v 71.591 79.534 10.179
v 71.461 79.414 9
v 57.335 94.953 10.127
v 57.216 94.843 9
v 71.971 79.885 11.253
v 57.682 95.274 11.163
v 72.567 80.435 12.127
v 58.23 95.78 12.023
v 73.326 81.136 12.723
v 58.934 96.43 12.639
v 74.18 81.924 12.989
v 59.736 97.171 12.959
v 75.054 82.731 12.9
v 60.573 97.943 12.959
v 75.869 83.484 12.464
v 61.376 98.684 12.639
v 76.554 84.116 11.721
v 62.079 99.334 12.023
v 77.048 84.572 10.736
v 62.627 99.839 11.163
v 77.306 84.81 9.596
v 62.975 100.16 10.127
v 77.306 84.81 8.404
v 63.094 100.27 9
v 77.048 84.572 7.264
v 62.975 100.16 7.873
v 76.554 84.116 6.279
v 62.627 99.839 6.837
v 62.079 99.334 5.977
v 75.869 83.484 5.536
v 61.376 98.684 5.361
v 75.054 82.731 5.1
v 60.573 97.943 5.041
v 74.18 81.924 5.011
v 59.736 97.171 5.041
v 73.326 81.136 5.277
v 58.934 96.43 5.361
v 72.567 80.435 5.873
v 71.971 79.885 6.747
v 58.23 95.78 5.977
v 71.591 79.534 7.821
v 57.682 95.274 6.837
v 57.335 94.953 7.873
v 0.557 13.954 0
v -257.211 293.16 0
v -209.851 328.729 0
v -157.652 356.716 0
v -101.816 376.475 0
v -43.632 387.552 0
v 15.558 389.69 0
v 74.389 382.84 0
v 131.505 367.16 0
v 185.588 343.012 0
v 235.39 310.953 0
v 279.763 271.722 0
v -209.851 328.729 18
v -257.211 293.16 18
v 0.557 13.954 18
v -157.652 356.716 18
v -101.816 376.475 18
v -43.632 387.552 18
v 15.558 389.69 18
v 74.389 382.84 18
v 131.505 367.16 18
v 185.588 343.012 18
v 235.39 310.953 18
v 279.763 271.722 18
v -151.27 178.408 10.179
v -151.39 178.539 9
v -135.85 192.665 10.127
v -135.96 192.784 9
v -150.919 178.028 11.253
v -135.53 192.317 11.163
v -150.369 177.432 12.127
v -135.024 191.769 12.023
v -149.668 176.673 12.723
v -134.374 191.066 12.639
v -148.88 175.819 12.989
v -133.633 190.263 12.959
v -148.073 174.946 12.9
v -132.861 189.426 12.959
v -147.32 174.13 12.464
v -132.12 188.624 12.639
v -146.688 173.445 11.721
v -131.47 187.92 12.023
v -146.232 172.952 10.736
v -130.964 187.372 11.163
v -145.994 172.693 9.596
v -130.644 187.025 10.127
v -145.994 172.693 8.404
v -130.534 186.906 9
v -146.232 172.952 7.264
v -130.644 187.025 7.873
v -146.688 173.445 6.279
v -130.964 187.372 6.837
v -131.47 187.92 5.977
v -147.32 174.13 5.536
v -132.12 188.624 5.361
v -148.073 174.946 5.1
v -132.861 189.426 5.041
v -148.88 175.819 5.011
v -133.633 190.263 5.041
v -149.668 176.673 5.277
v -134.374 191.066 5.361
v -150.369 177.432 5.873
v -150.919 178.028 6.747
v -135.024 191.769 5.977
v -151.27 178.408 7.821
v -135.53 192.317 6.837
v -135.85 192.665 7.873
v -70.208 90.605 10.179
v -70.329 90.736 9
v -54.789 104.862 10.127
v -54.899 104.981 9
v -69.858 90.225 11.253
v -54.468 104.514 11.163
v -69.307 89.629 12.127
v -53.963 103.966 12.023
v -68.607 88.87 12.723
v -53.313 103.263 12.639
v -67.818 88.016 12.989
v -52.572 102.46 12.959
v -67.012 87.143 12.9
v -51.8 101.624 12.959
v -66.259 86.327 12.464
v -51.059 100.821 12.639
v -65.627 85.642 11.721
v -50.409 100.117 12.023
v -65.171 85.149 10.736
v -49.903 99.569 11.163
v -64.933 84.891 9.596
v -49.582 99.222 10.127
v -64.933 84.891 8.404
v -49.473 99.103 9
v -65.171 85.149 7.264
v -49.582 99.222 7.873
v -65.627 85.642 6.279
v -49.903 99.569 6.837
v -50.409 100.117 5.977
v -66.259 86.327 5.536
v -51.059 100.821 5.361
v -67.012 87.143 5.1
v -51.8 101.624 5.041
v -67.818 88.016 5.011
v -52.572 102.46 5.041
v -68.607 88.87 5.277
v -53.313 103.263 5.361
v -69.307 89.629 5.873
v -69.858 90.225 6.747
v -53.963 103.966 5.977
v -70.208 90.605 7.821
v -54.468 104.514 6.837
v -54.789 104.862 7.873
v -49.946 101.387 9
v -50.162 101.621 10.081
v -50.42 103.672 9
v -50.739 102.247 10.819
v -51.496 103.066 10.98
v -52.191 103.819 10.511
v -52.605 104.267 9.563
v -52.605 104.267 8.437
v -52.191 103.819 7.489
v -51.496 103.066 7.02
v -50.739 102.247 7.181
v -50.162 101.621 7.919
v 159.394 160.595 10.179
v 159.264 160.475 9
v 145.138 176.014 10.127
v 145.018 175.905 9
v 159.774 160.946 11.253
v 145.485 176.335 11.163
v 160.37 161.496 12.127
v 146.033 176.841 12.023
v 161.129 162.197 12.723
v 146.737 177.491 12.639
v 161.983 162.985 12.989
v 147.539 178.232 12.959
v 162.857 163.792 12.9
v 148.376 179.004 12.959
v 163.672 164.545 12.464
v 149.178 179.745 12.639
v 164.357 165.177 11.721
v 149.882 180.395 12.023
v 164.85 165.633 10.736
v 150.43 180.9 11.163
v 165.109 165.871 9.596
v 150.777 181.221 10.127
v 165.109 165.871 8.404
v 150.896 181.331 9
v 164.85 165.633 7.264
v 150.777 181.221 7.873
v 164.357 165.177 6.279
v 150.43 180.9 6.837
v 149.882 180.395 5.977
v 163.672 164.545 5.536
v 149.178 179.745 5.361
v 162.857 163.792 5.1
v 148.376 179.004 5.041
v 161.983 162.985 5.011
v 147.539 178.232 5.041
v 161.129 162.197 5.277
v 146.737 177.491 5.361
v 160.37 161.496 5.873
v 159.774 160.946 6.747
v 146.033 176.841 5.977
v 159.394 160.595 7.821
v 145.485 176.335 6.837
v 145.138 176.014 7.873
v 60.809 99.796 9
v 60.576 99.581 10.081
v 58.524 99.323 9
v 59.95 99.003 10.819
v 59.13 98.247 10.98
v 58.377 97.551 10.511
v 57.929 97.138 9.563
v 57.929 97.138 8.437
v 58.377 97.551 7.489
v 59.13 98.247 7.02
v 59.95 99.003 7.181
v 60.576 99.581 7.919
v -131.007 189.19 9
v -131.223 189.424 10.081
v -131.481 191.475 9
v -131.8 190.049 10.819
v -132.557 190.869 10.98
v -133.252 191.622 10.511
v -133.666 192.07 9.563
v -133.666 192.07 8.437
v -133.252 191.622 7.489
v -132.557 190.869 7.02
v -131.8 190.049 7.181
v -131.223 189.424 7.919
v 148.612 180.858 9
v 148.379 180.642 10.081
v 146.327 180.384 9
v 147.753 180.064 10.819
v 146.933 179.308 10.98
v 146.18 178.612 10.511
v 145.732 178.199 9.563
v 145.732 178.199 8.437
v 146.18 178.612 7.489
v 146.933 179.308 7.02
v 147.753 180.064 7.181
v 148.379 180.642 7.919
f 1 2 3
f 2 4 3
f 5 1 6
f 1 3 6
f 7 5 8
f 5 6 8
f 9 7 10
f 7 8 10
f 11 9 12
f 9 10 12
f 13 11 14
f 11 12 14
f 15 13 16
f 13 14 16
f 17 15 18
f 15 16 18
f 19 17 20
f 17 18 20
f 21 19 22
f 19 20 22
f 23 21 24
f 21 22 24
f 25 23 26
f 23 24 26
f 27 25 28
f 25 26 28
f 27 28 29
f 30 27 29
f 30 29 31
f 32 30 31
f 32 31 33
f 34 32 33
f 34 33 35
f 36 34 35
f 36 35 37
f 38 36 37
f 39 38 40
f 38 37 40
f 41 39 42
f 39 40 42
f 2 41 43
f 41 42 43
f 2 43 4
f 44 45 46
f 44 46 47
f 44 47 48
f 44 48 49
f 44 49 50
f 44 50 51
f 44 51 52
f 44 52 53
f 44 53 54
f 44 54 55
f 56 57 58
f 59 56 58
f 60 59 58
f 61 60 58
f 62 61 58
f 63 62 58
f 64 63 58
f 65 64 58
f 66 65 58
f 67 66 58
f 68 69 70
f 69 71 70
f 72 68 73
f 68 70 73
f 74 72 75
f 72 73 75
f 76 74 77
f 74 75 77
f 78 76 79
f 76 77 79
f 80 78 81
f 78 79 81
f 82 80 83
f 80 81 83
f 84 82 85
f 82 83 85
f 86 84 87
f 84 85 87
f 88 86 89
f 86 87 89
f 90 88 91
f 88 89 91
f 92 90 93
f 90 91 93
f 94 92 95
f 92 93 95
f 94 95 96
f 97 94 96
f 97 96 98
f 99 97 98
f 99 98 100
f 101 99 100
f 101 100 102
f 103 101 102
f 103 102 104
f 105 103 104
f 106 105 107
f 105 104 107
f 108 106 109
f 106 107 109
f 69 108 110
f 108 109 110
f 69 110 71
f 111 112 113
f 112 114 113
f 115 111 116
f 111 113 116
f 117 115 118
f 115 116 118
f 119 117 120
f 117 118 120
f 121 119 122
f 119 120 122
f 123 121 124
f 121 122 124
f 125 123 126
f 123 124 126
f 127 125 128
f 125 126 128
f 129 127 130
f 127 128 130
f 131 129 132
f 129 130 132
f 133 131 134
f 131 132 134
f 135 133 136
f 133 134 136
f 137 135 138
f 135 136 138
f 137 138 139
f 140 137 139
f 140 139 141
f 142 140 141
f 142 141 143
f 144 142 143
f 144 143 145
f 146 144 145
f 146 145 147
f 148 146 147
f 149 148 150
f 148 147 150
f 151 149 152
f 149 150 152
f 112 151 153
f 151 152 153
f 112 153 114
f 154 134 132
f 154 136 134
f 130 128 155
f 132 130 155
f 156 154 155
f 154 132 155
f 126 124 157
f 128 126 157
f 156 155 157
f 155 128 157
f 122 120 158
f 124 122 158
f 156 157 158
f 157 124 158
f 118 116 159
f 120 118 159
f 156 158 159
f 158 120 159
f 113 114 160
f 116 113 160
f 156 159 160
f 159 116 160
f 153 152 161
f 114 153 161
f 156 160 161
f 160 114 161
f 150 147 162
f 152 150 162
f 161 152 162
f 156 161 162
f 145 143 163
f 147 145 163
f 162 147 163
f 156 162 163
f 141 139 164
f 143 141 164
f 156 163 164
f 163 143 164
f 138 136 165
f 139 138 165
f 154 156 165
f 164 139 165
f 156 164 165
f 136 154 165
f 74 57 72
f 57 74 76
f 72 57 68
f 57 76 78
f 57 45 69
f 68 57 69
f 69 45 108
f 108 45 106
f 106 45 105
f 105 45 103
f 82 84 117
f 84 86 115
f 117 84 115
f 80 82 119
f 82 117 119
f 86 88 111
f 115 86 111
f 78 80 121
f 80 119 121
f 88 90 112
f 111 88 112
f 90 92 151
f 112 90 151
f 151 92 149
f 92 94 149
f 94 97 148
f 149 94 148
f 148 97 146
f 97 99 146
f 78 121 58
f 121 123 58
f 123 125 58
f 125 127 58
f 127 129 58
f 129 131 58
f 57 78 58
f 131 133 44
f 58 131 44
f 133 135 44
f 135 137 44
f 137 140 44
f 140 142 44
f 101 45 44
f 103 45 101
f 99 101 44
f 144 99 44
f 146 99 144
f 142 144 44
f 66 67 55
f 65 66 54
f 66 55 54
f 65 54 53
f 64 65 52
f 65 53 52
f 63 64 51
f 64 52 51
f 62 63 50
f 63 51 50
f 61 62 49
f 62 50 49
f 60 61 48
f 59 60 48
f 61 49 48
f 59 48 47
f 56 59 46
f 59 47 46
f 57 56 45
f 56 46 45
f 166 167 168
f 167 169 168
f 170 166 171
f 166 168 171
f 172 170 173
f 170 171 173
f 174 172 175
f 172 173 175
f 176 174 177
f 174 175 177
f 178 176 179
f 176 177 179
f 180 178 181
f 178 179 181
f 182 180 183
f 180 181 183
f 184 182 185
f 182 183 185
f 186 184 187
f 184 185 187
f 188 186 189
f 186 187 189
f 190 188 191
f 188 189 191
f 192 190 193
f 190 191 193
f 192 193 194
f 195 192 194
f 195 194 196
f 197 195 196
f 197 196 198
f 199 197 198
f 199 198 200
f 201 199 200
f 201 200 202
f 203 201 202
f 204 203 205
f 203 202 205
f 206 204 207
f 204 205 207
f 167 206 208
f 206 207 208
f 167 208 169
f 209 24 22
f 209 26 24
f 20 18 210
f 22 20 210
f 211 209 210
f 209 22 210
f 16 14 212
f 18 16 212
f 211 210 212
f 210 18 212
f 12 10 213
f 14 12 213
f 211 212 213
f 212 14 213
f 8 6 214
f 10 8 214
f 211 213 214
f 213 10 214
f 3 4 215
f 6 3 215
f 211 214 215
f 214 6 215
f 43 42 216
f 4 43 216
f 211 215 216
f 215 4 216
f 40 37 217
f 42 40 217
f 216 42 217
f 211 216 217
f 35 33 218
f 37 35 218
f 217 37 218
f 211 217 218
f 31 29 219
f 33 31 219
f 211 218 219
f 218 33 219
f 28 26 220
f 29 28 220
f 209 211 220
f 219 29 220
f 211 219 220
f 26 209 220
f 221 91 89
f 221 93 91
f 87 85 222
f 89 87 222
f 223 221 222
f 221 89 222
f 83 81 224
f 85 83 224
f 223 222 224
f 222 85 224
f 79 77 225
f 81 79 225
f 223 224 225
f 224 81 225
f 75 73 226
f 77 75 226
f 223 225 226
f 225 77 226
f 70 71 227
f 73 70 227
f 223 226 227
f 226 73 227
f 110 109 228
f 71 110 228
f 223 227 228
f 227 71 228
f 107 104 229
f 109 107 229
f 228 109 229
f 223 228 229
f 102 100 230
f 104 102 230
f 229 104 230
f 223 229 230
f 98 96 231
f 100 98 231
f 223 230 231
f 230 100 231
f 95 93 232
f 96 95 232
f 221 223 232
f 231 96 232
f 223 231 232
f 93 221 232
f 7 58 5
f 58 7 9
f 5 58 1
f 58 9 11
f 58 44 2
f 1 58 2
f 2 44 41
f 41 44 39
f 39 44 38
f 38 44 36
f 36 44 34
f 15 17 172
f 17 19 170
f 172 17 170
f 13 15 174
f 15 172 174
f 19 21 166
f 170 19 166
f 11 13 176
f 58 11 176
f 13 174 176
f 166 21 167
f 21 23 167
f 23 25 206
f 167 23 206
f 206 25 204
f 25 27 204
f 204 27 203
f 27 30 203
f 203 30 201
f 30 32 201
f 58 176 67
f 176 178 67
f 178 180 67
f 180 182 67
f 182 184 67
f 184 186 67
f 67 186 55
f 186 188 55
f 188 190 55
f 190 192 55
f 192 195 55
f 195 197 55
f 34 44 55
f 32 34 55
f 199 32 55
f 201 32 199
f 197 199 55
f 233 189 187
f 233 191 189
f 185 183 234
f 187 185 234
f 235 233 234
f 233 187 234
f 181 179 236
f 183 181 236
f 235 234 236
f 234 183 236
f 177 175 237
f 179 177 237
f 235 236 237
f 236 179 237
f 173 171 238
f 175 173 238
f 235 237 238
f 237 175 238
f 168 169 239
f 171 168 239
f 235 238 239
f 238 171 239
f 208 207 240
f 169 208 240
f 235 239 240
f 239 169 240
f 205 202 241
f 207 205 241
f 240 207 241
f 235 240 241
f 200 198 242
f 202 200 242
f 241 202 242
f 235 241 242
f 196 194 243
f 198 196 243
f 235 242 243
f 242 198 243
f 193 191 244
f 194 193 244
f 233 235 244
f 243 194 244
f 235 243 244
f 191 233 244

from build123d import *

# Parameters (mm, degrees)
F1_DEPTH       = 18
F4_D           = 8
F4_DEPTH       = 21
F4_TIP         = 2.4034424761
F4_ON_F2_D     = 8
F4_ON_F2_DEPTH = 21
F4_ON_F2_TIP   = 2.4034424761


with BuildPart() as f1:
    # F0 (on Top) → F1 (new body)
    with BuildSketch(Plane.XY):
        with BuildLine():
            ThreePointArc((279.7628534604, 271.7218169814), (15.5579598443, 389.6895557819), (-257.2105231107, 293.1599338265))
            Line((-257.2105231107, 293.1599338265), (0.5571067524, 13.9541871184))
            Line((0.5571067524, 13.9541871184), (279.7628534604, 271.7218169814))
        make_face()
    extrude(amount=F1_DEPTH)

    # F4
    with Locations(Plane(origin=(-6.698540183, 7.2556469354, 0), x_dir=(0.734751965, 0.6783358681, 0), z_dir=(0.6783358681, -0.734751965, 0))):
        with Locations((110.3749609131, 9), (229.8749609131, 9)):
            Hole(F4_D / 2, depth=F4_DEPTH)
            with Locations((0, 0, -(F4_DEPTH + F4_TIP / 2))):  # 118° drill point
                Cone(0, F4_D / 2, F4_TIP, mode=Mode.SUBTRACT)

    # F4 on F2
    with Locations(Plane(origin=(7.2556469354, 6.698540183, 0), x_dir=(0.6783358681, -0.734751965, 0), z_dir=(-0.734751965, -0.6783358681, 0))):
        with Locations((-110.3749609131, 9), (-229.8749609131, 9)):
            Hole(F4_ON_F2_D / 2, depth=F4_ON_F2_DEPTH)
            with Locations((0, 0, -(F4_ON_F2_DEPTH + F4_ON_F2_TIP / 2))):  # 118° drill point
                Cone(0, F4_ON_F2_D / 2, F4_ON_F2_TIP, mode=Mode.SUBTRACT)


solid = f1.part
